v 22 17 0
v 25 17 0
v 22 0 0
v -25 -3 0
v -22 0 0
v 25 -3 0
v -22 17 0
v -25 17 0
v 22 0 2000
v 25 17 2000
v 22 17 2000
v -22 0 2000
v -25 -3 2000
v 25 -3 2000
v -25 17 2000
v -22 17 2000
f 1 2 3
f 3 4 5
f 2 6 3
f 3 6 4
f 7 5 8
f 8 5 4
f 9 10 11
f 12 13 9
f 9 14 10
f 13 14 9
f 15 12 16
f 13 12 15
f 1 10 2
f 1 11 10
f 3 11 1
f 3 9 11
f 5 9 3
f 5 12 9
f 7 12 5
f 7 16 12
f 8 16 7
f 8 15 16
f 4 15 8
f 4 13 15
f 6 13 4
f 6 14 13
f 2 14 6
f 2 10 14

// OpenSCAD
/*

 a |_| c
    b
 material_thickness = d
*/

module simple_profile_U(a,b,c,d, length) {
    translate([-b/2,-d,0])
    linear_extrude( height = length ) {
        polygon(
            points = [
                [0,0],
                [b,0],
                [b,c],
                [b-d,c],
                [b-d,d],
                [d,d],
                [d,a],
                [0,a]
            ],
            paths = [
                [0,1,2,3,4,5,6,7],
            ]
        );
    }
}

simple_profile_U(20,50,20,3, 2000);
